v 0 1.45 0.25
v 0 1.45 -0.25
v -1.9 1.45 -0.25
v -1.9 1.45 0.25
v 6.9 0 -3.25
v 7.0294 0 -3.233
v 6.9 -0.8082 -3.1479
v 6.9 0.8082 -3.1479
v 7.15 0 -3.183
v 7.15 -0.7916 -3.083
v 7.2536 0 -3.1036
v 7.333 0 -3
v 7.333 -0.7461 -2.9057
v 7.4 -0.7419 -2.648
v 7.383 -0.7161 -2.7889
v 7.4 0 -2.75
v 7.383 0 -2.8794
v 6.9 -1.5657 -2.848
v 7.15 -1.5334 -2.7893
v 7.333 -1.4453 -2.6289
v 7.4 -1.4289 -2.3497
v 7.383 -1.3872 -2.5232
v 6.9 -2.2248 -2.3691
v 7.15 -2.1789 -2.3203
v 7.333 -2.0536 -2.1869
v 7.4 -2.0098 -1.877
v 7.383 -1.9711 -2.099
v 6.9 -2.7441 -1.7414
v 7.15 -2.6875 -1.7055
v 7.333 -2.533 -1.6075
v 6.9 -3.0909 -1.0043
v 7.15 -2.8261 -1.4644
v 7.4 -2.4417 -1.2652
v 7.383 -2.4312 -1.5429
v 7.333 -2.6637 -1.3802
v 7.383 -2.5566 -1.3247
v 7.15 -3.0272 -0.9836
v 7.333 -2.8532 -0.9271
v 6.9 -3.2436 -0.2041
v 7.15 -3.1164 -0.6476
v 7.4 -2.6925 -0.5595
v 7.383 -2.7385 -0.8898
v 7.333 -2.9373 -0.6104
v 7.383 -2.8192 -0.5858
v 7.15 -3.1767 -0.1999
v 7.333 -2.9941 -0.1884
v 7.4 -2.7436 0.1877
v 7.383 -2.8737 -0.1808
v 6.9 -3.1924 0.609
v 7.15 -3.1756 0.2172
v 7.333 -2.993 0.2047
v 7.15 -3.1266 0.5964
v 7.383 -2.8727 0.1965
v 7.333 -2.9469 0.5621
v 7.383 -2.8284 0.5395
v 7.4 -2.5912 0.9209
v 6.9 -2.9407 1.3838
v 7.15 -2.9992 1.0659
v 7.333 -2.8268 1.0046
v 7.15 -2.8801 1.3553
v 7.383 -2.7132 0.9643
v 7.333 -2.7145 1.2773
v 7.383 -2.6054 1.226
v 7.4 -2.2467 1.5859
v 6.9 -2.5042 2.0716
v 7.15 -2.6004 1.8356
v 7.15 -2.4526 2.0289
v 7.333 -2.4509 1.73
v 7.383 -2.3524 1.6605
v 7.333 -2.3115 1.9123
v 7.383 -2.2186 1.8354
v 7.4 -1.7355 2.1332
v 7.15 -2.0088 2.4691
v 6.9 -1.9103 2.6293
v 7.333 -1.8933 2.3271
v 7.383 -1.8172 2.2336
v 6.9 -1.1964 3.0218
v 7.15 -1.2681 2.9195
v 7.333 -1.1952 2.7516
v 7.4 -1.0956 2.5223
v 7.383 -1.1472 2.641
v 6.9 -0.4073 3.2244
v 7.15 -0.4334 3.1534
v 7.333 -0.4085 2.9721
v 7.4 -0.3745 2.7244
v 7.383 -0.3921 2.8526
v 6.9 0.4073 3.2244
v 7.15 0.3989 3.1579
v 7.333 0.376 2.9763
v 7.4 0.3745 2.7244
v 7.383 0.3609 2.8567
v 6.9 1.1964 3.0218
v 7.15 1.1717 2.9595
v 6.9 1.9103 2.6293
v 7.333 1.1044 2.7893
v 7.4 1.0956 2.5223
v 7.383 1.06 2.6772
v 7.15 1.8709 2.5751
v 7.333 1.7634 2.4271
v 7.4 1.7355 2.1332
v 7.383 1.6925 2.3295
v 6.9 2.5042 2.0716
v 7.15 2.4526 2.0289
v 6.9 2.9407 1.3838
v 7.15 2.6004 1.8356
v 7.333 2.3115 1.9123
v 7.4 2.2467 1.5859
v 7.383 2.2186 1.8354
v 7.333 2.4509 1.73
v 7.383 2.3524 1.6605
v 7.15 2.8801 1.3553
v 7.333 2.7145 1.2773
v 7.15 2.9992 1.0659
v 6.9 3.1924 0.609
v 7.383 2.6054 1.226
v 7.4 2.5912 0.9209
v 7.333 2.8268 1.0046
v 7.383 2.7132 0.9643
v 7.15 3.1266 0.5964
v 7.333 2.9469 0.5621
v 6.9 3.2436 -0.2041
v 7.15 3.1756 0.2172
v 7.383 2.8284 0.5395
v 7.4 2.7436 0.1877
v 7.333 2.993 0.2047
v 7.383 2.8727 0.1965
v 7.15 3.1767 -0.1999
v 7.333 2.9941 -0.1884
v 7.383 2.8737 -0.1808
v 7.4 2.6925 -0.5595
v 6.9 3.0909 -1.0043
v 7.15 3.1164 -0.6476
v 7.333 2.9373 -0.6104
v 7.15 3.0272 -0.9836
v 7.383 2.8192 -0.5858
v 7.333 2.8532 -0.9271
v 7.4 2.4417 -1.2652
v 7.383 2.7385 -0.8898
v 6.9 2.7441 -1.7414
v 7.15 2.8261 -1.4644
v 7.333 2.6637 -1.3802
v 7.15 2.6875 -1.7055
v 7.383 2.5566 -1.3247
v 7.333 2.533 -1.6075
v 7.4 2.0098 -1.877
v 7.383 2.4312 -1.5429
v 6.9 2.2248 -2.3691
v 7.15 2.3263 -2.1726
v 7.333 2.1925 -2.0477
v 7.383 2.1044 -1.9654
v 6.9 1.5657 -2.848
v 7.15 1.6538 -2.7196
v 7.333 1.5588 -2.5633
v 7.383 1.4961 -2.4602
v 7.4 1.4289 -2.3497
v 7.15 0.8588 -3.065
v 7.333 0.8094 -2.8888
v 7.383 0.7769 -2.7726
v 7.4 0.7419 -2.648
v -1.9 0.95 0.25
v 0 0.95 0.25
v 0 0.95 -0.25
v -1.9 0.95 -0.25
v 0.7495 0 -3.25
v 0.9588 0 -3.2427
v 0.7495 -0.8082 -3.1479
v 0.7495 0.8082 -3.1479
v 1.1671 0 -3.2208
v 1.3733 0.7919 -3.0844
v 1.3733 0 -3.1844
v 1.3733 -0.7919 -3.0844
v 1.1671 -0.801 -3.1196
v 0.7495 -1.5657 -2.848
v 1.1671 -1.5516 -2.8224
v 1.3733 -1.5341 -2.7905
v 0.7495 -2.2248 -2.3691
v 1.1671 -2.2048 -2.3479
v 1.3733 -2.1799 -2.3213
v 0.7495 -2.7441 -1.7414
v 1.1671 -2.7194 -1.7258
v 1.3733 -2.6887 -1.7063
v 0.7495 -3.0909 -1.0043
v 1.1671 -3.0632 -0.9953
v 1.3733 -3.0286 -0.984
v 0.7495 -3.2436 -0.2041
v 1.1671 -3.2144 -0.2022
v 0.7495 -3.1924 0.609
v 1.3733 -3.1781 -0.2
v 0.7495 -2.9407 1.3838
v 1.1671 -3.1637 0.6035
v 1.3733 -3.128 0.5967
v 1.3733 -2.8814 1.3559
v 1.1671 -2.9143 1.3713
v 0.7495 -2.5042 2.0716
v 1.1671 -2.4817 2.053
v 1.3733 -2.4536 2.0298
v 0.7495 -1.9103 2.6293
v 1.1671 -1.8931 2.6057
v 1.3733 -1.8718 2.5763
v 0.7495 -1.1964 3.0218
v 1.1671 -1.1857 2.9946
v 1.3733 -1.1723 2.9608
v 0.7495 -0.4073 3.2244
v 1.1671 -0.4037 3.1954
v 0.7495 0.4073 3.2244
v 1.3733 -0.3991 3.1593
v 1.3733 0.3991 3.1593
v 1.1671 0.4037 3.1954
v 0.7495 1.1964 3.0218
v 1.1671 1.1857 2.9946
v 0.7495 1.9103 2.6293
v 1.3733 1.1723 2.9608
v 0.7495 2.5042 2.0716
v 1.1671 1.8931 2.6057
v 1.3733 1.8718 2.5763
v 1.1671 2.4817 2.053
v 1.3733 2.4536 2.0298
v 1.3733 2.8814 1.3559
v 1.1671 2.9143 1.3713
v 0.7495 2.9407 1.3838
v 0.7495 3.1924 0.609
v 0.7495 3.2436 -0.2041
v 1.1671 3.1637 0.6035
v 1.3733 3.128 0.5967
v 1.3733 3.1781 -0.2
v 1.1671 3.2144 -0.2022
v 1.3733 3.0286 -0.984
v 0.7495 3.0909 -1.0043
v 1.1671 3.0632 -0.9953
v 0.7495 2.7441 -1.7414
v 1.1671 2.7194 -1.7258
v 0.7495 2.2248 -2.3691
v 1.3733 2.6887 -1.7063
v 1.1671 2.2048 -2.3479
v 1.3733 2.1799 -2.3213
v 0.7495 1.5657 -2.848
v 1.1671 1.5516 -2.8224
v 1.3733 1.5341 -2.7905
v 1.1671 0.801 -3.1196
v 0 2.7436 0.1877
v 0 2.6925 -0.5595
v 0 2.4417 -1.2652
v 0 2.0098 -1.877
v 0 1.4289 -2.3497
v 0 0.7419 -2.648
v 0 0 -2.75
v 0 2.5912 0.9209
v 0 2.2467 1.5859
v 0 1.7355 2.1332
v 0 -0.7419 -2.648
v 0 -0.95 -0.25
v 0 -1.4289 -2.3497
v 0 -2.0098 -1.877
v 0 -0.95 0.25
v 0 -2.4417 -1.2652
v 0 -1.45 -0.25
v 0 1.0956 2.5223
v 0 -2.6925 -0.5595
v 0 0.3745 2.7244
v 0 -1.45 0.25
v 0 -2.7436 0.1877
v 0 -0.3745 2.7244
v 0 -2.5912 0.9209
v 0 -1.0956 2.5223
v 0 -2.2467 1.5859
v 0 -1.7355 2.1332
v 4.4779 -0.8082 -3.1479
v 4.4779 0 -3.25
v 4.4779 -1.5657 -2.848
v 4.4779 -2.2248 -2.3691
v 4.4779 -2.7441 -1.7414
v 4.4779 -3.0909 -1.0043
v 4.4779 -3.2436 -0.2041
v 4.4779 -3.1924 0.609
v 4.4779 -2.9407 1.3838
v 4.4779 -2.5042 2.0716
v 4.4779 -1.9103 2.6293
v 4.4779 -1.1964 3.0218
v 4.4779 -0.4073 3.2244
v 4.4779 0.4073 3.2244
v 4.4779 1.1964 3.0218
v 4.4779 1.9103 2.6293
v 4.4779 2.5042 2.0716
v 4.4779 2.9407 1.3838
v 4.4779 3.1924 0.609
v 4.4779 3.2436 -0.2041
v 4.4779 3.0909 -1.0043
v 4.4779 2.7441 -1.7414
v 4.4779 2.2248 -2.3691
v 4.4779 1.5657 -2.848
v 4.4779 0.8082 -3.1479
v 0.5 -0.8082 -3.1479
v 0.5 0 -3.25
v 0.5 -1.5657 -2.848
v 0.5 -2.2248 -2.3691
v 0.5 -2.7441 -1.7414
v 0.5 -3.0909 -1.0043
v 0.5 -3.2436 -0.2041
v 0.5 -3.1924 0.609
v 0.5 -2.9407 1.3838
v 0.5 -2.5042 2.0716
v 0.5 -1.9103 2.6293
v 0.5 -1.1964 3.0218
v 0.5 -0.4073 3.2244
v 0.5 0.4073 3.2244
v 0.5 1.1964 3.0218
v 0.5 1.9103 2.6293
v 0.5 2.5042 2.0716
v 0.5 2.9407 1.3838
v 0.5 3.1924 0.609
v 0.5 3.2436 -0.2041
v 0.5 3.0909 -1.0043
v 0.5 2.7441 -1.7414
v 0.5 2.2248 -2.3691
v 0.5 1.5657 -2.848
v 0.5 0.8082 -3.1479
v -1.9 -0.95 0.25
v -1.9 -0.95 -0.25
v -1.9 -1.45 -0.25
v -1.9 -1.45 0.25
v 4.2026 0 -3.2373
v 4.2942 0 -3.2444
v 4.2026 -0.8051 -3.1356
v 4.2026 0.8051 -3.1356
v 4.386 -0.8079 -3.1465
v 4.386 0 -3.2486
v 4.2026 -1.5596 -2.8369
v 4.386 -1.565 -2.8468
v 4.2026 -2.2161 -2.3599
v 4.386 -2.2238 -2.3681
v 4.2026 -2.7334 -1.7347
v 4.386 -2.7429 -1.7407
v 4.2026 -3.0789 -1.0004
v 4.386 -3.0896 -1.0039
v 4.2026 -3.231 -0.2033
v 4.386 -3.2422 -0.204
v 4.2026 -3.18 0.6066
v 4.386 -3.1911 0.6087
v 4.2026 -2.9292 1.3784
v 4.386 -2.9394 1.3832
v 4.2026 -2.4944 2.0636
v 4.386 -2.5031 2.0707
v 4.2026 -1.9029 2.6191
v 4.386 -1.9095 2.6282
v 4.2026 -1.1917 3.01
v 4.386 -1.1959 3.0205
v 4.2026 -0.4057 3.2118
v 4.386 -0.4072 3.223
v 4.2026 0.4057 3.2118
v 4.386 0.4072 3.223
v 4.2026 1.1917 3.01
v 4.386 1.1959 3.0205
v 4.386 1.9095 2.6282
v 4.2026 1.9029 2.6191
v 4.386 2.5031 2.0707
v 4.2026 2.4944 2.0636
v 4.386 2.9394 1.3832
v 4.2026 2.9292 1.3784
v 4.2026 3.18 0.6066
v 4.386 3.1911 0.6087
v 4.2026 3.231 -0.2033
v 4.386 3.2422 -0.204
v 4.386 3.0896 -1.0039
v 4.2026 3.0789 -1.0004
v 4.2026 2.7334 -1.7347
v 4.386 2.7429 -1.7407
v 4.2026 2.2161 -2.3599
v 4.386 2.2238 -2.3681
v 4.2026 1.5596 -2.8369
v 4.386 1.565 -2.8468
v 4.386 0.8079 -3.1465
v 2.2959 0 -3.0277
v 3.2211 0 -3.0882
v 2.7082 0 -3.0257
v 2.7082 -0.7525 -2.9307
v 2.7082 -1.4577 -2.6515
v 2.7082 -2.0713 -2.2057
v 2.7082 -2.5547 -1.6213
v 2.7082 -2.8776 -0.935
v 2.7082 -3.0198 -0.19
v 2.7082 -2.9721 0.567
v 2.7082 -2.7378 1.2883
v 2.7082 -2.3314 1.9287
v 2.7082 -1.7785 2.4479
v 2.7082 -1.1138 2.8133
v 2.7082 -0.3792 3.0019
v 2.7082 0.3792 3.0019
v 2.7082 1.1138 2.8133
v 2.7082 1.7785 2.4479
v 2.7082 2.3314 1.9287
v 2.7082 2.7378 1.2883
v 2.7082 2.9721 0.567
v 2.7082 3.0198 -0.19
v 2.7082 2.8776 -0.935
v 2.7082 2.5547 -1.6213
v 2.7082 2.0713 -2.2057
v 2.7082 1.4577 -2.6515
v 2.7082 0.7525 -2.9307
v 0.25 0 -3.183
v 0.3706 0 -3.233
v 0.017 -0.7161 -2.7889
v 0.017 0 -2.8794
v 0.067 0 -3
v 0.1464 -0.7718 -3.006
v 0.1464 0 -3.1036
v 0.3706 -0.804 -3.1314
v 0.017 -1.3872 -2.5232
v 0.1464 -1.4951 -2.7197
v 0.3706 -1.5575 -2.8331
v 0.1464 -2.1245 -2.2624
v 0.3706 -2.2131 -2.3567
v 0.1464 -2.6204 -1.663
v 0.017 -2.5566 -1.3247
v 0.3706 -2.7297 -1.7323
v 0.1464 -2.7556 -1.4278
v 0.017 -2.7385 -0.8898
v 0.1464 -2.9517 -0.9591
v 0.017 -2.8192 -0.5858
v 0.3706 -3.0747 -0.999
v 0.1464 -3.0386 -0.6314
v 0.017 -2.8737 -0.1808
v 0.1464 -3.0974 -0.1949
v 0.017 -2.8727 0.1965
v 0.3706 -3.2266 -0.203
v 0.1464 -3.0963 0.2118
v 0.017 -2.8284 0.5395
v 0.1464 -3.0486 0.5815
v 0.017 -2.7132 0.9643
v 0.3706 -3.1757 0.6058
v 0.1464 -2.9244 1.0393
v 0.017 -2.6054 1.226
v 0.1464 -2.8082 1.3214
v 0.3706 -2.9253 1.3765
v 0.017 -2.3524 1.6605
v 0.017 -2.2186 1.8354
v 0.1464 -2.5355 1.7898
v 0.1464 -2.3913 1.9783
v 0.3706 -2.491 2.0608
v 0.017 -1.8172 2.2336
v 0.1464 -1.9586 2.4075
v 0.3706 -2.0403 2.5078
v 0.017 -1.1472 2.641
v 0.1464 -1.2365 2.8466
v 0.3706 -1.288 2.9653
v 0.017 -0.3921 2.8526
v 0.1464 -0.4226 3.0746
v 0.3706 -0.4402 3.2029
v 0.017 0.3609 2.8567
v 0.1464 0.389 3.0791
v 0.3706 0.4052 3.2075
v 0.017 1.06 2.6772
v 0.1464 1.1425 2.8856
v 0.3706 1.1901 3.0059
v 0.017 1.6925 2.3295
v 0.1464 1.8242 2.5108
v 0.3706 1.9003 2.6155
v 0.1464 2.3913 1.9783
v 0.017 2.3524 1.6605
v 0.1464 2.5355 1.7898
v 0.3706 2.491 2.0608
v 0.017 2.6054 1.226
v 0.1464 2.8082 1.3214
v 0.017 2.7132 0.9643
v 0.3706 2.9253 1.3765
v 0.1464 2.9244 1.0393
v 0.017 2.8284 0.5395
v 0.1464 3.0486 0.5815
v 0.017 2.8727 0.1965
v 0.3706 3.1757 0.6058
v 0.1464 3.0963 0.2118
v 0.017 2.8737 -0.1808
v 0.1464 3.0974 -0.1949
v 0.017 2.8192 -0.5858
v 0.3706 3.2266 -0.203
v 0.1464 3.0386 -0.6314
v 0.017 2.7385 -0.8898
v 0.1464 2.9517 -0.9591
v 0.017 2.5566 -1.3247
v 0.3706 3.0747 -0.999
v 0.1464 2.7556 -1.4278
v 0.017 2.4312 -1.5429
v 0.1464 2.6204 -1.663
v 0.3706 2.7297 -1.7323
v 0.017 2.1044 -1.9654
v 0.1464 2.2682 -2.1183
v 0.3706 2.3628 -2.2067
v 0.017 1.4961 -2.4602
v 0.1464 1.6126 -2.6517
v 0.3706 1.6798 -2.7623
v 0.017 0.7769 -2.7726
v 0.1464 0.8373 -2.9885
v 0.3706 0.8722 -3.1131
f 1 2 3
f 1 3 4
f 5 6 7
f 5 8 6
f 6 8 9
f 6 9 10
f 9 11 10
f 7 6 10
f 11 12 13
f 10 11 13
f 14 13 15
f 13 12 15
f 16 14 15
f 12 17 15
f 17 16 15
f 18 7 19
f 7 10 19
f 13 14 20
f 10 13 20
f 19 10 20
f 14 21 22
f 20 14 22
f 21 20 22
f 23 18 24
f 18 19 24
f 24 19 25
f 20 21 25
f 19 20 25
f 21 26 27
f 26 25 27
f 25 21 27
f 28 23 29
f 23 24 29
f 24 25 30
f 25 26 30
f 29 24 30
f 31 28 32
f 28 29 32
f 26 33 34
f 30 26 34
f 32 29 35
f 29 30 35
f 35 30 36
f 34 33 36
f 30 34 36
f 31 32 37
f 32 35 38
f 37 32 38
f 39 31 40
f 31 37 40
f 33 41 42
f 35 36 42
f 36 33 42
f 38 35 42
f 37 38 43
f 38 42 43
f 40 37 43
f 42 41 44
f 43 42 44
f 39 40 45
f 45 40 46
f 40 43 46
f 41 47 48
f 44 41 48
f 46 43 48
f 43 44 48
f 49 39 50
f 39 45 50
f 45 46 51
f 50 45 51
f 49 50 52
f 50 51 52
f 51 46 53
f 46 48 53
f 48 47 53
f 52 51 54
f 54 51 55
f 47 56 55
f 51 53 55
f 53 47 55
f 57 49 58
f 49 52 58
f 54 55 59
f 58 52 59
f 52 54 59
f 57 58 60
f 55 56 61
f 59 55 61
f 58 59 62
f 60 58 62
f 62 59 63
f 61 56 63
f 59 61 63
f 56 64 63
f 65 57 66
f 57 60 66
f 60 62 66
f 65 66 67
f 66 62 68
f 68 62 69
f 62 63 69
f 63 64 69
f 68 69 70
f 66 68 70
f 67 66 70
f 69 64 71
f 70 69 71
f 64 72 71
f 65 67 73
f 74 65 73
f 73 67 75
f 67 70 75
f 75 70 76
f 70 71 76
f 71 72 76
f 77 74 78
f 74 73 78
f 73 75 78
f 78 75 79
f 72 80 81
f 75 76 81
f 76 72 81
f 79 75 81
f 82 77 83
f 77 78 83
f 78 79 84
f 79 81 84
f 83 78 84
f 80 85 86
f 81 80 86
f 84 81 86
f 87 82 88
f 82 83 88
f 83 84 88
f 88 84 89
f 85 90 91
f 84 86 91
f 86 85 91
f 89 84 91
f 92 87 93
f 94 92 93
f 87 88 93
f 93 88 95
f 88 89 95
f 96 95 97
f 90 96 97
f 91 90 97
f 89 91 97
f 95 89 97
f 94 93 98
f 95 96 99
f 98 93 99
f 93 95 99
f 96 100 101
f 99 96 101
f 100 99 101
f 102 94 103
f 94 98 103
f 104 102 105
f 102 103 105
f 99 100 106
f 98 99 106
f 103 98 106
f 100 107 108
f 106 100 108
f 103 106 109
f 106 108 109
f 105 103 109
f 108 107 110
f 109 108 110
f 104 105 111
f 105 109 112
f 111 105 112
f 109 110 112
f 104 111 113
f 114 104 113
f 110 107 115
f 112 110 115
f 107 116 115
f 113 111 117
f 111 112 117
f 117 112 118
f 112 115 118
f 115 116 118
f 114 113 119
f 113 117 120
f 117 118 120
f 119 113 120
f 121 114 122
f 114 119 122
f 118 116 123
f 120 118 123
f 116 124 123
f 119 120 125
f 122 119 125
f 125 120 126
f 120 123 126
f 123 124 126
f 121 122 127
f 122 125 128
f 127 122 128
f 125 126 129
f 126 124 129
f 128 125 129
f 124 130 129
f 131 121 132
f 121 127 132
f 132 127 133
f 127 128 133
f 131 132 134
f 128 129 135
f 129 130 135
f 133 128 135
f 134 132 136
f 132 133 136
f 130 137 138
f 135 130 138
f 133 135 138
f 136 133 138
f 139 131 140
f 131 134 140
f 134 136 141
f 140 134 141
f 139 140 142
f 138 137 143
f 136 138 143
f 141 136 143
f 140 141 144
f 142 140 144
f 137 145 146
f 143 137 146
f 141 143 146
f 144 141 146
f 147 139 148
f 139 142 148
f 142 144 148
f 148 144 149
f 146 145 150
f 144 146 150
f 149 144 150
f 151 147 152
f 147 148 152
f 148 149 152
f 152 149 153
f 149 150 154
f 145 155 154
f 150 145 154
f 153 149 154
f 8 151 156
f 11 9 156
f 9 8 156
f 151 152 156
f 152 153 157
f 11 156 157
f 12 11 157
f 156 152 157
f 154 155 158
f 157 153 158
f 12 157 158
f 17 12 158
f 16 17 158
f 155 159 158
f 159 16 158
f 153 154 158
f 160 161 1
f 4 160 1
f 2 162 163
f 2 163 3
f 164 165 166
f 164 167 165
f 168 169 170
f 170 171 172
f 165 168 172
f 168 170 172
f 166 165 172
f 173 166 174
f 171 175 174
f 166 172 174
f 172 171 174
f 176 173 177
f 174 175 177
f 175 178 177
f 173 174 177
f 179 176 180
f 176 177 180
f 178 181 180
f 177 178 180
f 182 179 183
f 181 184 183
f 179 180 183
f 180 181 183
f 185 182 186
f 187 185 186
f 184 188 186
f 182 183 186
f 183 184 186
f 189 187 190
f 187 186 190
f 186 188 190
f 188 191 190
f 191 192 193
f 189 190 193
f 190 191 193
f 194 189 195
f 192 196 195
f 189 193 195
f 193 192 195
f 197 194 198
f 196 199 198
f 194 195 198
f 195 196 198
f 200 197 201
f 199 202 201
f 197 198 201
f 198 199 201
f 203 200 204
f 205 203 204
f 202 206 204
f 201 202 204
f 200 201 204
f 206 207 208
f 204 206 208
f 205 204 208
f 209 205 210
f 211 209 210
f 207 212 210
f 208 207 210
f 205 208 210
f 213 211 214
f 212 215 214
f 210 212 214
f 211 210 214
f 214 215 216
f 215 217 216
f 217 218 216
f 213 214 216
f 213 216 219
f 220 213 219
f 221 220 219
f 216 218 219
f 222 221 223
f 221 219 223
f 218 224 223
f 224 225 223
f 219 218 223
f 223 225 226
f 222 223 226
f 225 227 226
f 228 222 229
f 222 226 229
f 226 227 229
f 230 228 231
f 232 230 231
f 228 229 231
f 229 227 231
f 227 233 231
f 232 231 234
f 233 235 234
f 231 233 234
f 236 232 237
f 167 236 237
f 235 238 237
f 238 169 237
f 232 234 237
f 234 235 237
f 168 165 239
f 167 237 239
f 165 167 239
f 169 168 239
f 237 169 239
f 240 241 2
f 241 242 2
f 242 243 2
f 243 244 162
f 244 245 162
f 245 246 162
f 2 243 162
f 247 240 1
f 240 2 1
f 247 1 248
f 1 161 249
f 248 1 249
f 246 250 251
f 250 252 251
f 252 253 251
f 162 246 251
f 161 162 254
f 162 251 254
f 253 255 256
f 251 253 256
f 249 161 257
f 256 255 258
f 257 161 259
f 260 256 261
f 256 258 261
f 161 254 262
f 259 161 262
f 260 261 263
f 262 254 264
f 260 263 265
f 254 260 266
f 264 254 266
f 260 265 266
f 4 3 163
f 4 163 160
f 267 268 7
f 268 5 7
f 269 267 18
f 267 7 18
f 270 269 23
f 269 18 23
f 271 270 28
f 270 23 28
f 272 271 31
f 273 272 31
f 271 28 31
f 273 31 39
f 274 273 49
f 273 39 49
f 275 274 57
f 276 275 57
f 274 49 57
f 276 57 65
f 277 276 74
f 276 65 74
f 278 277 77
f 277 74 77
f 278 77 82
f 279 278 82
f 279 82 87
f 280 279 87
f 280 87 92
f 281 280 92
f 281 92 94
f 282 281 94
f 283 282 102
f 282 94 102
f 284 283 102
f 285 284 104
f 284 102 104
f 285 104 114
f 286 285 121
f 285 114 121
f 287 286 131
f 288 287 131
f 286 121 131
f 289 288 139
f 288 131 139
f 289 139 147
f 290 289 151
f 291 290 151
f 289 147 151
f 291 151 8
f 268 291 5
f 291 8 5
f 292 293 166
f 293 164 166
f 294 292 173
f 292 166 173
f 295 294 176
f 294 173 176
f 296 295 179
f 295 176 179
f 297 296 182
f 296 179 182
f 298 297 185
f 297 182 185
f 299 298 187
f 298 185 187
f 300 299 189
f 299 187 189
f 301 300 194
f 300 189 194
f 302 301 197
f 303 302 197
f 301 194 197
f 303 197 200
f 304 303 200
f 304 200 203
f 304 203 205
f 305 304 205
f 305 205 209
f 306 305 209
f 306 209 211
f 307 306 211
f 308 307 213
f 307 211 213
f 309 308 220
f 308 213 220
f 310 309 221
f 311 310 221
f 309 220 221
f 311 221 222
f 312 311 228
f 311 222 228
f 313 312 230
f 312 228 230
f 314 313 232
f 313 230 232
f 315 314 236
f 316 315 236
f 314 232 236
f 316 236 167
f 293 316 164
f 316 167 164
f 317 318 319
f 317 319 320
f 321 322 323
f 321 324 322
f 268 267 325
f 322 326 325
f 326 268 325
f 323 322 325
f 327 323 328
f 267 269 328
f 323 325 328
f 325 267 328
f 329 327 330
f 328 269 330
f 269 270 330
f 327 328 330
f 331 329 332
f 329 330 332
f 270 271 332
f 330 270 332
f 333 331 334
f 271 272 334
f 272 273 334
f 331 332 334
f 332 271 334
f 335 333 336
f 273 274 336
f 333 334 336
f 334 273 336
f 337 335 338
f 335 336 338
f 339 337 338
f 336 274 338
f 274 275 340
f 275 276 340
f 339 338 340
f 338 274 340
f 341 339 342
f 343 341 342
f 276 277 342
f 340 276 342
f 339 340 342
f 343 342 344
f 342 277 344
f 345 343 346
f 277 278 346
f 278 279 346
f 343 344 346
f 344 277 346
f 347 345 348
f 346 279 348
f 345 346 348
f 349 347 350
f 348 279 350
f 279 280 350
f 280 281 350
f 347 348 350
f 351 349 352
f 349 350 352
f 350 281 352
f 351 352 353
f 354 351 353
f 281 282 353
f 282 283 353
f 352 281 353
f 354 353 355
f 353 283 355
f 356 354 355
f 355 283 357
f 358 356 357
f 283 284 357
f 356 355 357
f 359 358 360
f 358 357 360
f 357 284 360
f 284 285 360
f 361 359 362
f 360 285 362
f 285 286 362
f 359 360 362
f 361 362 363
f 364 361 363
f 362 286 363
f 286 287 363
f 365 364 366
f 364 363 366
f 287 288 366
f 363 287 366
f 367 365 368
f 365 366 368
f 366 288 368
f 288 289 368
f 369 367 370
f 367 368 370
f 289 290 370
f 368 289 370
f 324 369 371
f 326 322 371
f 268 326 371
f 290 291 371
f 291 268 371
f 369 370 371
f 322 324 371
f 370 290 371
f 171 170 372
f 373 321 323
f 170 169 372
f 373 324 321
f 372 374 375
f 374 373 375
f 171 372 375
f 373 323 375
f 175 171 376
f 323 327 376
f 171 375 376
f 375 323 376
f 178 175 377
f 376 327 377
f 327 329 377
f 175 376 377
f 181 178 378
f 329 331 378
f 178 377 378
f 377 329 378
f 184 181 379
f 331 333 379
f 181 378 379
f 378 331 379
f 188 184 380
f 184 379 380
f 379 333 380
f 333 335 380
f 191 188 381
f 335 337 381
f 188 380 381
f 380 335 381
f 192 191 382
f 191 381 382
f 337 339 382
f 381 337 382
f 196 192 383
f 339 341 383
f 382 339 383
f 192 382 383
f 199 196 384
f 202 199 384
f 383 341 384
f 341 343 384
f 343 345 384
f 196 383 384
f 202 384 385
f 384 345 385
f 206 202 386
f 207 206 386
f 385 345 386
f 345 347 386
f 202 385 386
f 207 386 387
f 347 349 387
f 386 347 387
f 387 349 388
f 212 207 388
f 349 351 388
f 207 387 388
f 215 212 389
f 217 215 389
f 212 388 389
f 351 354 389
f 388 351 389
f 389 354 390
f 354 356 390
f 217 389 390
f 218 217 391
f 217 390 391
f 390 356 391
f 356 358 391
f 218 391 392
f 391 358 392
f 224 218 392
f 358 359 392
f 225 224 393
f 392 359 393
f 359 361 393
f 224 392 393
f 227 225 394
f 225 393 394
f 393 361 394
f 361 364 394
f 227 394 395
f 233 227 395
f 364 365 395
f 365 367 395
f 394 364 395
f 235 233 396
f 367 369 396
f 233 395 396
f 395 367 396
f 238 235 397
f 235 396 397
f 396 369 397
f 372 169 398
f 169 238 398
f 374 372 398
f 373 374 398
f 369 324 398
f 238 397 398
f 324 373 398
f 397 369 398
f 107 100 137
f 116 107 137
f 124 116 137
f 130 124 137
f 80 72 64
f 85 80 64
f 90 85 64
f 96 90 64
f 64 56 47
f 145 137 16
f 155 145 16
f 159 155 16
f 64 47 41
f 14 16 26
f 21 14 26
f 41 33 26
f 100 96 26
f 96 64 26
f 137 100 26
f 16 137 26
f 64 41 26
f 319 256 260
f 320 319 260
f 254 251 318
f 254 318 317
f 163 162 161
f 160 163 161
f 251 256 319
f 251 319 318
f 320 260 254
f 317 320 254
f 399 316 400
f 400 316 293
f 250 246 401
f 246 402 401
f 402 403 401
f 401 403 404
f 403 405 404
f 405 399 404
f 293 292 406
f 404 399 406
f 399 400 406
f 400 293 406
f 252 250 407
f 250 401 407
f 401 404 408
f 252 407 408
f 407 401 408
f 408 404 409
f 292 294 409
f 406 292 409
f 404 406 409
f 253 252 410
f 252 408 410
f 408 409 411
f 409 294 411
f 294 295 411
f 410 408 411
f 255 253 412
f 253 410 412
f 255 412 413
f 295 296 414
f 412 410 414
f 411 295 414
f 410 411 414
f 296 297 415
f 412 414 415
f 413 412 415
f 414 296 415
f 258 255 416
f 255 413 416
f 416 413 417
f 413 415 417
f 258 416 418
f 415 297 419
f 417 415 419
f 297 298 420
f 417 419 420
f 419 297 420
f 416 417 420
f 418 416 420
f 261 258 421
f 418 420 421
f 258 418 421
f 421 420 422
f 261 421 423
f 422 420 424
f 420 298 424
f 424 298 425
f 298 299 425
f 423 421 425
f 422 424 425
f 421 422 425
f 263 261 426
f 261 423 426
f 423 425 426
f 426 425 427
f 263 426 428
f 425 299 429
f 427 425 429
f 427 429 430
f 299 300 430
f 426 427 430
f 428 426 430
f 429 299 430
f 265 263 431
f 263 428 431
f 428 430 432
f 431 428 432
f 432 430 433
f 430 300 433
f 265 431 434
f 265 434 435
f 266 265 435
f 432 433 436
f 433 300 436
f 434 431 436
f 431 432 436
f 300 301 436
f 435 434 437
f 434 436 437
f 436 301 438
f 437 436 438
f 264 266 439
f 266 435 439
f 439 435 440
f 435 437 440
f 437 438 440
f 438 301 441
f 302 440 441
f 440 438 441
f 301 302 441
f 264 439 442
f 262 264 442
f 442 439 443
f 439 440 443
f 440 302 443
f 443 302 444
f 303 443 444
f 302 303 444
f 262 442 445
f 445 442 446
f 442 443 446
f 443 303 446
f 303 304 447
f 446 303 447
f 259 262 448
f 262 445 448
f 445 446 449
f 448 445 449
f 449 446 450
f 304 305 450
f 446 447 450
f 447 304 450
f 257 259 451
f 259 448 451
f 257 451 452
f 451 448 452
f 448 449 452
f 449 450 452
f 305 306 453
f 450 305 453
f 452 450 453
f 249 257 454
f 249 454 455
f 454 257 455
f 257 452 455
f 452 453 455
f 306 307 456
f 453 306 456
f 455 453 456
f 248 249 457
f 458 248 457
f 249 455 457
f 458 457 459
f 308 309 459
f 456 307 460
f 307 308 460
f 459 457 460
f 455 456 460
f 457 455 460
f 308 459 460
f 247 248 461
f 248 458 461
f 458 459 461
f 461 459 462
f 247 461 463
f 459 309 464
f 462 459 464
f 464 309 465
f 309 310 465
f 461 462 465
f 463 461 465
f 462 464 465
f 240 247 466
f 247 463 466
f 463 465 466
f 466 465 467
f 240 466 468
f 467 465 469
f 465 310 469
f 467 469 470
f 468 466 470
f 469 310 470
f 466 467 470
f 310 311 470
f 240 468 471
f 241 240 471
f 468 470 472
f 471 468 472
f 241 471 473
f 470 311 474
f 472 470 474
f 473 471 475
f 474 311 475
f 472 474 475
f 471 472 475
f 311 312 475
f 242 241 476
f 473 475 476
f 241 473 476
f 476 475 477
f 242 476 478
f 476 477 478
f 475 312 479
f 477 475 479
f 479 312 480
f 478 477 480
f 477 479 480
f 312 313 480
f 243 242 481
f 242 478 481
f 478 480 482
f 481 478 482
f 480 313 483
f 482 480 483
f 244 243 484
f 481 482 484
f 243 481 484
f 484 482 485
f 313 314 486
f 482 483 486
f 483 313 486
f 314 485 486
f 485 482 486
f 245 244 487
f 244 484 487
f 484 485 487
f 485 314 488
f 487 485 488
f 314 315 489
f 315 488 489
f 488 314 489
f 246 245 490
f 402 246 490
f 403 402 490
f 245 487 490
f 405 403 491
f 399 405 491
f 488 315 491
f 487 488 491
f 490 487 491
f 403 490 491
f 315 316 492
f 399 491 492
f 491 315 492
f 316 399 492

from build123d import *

# Parameters (mm, degrees)
SKICA2_W                = 0.5
SKICA2_H                = 0.5
P_IDAT_VYSUNUT_M1_DEPTH = 1.9


with BuildPart() as part:
    # Skica1 → Rotovat1 (revolve)
    with BuildSketch(Plane.XY, mode=Mode.PRIVATE) as rotovat1_sk:
        with BuildLine():
            Line((0, 0), (0, 2.75))
            ThreePointArc((0, 2.75), (0.146446609, 3.103553391), (0.5, 3.25))
            Line((0.5, 3.25), (0.749493844, 3.25))
            ThreePointArc((0.749493844, 3.25), (1.063131818, 3.233560159), (1.373332352, 3.184420814))
            add(Edge.make_bspline(
                [(1.373332352, 3.184420814), (1.844148672, 3.08432837), (2.637509596, 2.913100219), (3.679859415, 3.18917118), (4.202566014, 3.237341565)],
                knots=[0.049740357, 0.049740357, 0.049740357, 0.049740357, 0.292962234, 0.585924467, 0.585924467, 0.585924467, 0.585924467], degree=3))
            ThreePointArc((4.202566014, 3.237341565), (4.340070837, 3.24683372), (4.477866527, 3.25))
            Line((4.477866527, 3.25), (6.9, 3.25))
            ThreePointArc((6.9, 3.25), (7.253553391, 3.103553391), (7.4, 2.75))
            Line((7.4, 2.75), (7.4, 0))
            Line((7.4, 0), (0, 0))
        make_face()
    revolve(rotovat1_sk.sketch.rotate(Axis((7.4, 0, 0), (-1, 0, 0)), 90), axis=Axis((7.4, 0, 0), (-1, 0, 0)))

    # Skica2 → Přidat vysunutím1 (add)
    with BuildSketch(Plane.ZY):
        with Locations((0, -1.2)):
            Rectangle(SKICA2_W, SKICA2_H)
        with Locations((0, 1.2)):
            Rectangle(SKICA2_W, SKICA2_H)
    extrude(amount=P_IDAT_VYSUNUT_M1_DEPTH)


solid = part.part
